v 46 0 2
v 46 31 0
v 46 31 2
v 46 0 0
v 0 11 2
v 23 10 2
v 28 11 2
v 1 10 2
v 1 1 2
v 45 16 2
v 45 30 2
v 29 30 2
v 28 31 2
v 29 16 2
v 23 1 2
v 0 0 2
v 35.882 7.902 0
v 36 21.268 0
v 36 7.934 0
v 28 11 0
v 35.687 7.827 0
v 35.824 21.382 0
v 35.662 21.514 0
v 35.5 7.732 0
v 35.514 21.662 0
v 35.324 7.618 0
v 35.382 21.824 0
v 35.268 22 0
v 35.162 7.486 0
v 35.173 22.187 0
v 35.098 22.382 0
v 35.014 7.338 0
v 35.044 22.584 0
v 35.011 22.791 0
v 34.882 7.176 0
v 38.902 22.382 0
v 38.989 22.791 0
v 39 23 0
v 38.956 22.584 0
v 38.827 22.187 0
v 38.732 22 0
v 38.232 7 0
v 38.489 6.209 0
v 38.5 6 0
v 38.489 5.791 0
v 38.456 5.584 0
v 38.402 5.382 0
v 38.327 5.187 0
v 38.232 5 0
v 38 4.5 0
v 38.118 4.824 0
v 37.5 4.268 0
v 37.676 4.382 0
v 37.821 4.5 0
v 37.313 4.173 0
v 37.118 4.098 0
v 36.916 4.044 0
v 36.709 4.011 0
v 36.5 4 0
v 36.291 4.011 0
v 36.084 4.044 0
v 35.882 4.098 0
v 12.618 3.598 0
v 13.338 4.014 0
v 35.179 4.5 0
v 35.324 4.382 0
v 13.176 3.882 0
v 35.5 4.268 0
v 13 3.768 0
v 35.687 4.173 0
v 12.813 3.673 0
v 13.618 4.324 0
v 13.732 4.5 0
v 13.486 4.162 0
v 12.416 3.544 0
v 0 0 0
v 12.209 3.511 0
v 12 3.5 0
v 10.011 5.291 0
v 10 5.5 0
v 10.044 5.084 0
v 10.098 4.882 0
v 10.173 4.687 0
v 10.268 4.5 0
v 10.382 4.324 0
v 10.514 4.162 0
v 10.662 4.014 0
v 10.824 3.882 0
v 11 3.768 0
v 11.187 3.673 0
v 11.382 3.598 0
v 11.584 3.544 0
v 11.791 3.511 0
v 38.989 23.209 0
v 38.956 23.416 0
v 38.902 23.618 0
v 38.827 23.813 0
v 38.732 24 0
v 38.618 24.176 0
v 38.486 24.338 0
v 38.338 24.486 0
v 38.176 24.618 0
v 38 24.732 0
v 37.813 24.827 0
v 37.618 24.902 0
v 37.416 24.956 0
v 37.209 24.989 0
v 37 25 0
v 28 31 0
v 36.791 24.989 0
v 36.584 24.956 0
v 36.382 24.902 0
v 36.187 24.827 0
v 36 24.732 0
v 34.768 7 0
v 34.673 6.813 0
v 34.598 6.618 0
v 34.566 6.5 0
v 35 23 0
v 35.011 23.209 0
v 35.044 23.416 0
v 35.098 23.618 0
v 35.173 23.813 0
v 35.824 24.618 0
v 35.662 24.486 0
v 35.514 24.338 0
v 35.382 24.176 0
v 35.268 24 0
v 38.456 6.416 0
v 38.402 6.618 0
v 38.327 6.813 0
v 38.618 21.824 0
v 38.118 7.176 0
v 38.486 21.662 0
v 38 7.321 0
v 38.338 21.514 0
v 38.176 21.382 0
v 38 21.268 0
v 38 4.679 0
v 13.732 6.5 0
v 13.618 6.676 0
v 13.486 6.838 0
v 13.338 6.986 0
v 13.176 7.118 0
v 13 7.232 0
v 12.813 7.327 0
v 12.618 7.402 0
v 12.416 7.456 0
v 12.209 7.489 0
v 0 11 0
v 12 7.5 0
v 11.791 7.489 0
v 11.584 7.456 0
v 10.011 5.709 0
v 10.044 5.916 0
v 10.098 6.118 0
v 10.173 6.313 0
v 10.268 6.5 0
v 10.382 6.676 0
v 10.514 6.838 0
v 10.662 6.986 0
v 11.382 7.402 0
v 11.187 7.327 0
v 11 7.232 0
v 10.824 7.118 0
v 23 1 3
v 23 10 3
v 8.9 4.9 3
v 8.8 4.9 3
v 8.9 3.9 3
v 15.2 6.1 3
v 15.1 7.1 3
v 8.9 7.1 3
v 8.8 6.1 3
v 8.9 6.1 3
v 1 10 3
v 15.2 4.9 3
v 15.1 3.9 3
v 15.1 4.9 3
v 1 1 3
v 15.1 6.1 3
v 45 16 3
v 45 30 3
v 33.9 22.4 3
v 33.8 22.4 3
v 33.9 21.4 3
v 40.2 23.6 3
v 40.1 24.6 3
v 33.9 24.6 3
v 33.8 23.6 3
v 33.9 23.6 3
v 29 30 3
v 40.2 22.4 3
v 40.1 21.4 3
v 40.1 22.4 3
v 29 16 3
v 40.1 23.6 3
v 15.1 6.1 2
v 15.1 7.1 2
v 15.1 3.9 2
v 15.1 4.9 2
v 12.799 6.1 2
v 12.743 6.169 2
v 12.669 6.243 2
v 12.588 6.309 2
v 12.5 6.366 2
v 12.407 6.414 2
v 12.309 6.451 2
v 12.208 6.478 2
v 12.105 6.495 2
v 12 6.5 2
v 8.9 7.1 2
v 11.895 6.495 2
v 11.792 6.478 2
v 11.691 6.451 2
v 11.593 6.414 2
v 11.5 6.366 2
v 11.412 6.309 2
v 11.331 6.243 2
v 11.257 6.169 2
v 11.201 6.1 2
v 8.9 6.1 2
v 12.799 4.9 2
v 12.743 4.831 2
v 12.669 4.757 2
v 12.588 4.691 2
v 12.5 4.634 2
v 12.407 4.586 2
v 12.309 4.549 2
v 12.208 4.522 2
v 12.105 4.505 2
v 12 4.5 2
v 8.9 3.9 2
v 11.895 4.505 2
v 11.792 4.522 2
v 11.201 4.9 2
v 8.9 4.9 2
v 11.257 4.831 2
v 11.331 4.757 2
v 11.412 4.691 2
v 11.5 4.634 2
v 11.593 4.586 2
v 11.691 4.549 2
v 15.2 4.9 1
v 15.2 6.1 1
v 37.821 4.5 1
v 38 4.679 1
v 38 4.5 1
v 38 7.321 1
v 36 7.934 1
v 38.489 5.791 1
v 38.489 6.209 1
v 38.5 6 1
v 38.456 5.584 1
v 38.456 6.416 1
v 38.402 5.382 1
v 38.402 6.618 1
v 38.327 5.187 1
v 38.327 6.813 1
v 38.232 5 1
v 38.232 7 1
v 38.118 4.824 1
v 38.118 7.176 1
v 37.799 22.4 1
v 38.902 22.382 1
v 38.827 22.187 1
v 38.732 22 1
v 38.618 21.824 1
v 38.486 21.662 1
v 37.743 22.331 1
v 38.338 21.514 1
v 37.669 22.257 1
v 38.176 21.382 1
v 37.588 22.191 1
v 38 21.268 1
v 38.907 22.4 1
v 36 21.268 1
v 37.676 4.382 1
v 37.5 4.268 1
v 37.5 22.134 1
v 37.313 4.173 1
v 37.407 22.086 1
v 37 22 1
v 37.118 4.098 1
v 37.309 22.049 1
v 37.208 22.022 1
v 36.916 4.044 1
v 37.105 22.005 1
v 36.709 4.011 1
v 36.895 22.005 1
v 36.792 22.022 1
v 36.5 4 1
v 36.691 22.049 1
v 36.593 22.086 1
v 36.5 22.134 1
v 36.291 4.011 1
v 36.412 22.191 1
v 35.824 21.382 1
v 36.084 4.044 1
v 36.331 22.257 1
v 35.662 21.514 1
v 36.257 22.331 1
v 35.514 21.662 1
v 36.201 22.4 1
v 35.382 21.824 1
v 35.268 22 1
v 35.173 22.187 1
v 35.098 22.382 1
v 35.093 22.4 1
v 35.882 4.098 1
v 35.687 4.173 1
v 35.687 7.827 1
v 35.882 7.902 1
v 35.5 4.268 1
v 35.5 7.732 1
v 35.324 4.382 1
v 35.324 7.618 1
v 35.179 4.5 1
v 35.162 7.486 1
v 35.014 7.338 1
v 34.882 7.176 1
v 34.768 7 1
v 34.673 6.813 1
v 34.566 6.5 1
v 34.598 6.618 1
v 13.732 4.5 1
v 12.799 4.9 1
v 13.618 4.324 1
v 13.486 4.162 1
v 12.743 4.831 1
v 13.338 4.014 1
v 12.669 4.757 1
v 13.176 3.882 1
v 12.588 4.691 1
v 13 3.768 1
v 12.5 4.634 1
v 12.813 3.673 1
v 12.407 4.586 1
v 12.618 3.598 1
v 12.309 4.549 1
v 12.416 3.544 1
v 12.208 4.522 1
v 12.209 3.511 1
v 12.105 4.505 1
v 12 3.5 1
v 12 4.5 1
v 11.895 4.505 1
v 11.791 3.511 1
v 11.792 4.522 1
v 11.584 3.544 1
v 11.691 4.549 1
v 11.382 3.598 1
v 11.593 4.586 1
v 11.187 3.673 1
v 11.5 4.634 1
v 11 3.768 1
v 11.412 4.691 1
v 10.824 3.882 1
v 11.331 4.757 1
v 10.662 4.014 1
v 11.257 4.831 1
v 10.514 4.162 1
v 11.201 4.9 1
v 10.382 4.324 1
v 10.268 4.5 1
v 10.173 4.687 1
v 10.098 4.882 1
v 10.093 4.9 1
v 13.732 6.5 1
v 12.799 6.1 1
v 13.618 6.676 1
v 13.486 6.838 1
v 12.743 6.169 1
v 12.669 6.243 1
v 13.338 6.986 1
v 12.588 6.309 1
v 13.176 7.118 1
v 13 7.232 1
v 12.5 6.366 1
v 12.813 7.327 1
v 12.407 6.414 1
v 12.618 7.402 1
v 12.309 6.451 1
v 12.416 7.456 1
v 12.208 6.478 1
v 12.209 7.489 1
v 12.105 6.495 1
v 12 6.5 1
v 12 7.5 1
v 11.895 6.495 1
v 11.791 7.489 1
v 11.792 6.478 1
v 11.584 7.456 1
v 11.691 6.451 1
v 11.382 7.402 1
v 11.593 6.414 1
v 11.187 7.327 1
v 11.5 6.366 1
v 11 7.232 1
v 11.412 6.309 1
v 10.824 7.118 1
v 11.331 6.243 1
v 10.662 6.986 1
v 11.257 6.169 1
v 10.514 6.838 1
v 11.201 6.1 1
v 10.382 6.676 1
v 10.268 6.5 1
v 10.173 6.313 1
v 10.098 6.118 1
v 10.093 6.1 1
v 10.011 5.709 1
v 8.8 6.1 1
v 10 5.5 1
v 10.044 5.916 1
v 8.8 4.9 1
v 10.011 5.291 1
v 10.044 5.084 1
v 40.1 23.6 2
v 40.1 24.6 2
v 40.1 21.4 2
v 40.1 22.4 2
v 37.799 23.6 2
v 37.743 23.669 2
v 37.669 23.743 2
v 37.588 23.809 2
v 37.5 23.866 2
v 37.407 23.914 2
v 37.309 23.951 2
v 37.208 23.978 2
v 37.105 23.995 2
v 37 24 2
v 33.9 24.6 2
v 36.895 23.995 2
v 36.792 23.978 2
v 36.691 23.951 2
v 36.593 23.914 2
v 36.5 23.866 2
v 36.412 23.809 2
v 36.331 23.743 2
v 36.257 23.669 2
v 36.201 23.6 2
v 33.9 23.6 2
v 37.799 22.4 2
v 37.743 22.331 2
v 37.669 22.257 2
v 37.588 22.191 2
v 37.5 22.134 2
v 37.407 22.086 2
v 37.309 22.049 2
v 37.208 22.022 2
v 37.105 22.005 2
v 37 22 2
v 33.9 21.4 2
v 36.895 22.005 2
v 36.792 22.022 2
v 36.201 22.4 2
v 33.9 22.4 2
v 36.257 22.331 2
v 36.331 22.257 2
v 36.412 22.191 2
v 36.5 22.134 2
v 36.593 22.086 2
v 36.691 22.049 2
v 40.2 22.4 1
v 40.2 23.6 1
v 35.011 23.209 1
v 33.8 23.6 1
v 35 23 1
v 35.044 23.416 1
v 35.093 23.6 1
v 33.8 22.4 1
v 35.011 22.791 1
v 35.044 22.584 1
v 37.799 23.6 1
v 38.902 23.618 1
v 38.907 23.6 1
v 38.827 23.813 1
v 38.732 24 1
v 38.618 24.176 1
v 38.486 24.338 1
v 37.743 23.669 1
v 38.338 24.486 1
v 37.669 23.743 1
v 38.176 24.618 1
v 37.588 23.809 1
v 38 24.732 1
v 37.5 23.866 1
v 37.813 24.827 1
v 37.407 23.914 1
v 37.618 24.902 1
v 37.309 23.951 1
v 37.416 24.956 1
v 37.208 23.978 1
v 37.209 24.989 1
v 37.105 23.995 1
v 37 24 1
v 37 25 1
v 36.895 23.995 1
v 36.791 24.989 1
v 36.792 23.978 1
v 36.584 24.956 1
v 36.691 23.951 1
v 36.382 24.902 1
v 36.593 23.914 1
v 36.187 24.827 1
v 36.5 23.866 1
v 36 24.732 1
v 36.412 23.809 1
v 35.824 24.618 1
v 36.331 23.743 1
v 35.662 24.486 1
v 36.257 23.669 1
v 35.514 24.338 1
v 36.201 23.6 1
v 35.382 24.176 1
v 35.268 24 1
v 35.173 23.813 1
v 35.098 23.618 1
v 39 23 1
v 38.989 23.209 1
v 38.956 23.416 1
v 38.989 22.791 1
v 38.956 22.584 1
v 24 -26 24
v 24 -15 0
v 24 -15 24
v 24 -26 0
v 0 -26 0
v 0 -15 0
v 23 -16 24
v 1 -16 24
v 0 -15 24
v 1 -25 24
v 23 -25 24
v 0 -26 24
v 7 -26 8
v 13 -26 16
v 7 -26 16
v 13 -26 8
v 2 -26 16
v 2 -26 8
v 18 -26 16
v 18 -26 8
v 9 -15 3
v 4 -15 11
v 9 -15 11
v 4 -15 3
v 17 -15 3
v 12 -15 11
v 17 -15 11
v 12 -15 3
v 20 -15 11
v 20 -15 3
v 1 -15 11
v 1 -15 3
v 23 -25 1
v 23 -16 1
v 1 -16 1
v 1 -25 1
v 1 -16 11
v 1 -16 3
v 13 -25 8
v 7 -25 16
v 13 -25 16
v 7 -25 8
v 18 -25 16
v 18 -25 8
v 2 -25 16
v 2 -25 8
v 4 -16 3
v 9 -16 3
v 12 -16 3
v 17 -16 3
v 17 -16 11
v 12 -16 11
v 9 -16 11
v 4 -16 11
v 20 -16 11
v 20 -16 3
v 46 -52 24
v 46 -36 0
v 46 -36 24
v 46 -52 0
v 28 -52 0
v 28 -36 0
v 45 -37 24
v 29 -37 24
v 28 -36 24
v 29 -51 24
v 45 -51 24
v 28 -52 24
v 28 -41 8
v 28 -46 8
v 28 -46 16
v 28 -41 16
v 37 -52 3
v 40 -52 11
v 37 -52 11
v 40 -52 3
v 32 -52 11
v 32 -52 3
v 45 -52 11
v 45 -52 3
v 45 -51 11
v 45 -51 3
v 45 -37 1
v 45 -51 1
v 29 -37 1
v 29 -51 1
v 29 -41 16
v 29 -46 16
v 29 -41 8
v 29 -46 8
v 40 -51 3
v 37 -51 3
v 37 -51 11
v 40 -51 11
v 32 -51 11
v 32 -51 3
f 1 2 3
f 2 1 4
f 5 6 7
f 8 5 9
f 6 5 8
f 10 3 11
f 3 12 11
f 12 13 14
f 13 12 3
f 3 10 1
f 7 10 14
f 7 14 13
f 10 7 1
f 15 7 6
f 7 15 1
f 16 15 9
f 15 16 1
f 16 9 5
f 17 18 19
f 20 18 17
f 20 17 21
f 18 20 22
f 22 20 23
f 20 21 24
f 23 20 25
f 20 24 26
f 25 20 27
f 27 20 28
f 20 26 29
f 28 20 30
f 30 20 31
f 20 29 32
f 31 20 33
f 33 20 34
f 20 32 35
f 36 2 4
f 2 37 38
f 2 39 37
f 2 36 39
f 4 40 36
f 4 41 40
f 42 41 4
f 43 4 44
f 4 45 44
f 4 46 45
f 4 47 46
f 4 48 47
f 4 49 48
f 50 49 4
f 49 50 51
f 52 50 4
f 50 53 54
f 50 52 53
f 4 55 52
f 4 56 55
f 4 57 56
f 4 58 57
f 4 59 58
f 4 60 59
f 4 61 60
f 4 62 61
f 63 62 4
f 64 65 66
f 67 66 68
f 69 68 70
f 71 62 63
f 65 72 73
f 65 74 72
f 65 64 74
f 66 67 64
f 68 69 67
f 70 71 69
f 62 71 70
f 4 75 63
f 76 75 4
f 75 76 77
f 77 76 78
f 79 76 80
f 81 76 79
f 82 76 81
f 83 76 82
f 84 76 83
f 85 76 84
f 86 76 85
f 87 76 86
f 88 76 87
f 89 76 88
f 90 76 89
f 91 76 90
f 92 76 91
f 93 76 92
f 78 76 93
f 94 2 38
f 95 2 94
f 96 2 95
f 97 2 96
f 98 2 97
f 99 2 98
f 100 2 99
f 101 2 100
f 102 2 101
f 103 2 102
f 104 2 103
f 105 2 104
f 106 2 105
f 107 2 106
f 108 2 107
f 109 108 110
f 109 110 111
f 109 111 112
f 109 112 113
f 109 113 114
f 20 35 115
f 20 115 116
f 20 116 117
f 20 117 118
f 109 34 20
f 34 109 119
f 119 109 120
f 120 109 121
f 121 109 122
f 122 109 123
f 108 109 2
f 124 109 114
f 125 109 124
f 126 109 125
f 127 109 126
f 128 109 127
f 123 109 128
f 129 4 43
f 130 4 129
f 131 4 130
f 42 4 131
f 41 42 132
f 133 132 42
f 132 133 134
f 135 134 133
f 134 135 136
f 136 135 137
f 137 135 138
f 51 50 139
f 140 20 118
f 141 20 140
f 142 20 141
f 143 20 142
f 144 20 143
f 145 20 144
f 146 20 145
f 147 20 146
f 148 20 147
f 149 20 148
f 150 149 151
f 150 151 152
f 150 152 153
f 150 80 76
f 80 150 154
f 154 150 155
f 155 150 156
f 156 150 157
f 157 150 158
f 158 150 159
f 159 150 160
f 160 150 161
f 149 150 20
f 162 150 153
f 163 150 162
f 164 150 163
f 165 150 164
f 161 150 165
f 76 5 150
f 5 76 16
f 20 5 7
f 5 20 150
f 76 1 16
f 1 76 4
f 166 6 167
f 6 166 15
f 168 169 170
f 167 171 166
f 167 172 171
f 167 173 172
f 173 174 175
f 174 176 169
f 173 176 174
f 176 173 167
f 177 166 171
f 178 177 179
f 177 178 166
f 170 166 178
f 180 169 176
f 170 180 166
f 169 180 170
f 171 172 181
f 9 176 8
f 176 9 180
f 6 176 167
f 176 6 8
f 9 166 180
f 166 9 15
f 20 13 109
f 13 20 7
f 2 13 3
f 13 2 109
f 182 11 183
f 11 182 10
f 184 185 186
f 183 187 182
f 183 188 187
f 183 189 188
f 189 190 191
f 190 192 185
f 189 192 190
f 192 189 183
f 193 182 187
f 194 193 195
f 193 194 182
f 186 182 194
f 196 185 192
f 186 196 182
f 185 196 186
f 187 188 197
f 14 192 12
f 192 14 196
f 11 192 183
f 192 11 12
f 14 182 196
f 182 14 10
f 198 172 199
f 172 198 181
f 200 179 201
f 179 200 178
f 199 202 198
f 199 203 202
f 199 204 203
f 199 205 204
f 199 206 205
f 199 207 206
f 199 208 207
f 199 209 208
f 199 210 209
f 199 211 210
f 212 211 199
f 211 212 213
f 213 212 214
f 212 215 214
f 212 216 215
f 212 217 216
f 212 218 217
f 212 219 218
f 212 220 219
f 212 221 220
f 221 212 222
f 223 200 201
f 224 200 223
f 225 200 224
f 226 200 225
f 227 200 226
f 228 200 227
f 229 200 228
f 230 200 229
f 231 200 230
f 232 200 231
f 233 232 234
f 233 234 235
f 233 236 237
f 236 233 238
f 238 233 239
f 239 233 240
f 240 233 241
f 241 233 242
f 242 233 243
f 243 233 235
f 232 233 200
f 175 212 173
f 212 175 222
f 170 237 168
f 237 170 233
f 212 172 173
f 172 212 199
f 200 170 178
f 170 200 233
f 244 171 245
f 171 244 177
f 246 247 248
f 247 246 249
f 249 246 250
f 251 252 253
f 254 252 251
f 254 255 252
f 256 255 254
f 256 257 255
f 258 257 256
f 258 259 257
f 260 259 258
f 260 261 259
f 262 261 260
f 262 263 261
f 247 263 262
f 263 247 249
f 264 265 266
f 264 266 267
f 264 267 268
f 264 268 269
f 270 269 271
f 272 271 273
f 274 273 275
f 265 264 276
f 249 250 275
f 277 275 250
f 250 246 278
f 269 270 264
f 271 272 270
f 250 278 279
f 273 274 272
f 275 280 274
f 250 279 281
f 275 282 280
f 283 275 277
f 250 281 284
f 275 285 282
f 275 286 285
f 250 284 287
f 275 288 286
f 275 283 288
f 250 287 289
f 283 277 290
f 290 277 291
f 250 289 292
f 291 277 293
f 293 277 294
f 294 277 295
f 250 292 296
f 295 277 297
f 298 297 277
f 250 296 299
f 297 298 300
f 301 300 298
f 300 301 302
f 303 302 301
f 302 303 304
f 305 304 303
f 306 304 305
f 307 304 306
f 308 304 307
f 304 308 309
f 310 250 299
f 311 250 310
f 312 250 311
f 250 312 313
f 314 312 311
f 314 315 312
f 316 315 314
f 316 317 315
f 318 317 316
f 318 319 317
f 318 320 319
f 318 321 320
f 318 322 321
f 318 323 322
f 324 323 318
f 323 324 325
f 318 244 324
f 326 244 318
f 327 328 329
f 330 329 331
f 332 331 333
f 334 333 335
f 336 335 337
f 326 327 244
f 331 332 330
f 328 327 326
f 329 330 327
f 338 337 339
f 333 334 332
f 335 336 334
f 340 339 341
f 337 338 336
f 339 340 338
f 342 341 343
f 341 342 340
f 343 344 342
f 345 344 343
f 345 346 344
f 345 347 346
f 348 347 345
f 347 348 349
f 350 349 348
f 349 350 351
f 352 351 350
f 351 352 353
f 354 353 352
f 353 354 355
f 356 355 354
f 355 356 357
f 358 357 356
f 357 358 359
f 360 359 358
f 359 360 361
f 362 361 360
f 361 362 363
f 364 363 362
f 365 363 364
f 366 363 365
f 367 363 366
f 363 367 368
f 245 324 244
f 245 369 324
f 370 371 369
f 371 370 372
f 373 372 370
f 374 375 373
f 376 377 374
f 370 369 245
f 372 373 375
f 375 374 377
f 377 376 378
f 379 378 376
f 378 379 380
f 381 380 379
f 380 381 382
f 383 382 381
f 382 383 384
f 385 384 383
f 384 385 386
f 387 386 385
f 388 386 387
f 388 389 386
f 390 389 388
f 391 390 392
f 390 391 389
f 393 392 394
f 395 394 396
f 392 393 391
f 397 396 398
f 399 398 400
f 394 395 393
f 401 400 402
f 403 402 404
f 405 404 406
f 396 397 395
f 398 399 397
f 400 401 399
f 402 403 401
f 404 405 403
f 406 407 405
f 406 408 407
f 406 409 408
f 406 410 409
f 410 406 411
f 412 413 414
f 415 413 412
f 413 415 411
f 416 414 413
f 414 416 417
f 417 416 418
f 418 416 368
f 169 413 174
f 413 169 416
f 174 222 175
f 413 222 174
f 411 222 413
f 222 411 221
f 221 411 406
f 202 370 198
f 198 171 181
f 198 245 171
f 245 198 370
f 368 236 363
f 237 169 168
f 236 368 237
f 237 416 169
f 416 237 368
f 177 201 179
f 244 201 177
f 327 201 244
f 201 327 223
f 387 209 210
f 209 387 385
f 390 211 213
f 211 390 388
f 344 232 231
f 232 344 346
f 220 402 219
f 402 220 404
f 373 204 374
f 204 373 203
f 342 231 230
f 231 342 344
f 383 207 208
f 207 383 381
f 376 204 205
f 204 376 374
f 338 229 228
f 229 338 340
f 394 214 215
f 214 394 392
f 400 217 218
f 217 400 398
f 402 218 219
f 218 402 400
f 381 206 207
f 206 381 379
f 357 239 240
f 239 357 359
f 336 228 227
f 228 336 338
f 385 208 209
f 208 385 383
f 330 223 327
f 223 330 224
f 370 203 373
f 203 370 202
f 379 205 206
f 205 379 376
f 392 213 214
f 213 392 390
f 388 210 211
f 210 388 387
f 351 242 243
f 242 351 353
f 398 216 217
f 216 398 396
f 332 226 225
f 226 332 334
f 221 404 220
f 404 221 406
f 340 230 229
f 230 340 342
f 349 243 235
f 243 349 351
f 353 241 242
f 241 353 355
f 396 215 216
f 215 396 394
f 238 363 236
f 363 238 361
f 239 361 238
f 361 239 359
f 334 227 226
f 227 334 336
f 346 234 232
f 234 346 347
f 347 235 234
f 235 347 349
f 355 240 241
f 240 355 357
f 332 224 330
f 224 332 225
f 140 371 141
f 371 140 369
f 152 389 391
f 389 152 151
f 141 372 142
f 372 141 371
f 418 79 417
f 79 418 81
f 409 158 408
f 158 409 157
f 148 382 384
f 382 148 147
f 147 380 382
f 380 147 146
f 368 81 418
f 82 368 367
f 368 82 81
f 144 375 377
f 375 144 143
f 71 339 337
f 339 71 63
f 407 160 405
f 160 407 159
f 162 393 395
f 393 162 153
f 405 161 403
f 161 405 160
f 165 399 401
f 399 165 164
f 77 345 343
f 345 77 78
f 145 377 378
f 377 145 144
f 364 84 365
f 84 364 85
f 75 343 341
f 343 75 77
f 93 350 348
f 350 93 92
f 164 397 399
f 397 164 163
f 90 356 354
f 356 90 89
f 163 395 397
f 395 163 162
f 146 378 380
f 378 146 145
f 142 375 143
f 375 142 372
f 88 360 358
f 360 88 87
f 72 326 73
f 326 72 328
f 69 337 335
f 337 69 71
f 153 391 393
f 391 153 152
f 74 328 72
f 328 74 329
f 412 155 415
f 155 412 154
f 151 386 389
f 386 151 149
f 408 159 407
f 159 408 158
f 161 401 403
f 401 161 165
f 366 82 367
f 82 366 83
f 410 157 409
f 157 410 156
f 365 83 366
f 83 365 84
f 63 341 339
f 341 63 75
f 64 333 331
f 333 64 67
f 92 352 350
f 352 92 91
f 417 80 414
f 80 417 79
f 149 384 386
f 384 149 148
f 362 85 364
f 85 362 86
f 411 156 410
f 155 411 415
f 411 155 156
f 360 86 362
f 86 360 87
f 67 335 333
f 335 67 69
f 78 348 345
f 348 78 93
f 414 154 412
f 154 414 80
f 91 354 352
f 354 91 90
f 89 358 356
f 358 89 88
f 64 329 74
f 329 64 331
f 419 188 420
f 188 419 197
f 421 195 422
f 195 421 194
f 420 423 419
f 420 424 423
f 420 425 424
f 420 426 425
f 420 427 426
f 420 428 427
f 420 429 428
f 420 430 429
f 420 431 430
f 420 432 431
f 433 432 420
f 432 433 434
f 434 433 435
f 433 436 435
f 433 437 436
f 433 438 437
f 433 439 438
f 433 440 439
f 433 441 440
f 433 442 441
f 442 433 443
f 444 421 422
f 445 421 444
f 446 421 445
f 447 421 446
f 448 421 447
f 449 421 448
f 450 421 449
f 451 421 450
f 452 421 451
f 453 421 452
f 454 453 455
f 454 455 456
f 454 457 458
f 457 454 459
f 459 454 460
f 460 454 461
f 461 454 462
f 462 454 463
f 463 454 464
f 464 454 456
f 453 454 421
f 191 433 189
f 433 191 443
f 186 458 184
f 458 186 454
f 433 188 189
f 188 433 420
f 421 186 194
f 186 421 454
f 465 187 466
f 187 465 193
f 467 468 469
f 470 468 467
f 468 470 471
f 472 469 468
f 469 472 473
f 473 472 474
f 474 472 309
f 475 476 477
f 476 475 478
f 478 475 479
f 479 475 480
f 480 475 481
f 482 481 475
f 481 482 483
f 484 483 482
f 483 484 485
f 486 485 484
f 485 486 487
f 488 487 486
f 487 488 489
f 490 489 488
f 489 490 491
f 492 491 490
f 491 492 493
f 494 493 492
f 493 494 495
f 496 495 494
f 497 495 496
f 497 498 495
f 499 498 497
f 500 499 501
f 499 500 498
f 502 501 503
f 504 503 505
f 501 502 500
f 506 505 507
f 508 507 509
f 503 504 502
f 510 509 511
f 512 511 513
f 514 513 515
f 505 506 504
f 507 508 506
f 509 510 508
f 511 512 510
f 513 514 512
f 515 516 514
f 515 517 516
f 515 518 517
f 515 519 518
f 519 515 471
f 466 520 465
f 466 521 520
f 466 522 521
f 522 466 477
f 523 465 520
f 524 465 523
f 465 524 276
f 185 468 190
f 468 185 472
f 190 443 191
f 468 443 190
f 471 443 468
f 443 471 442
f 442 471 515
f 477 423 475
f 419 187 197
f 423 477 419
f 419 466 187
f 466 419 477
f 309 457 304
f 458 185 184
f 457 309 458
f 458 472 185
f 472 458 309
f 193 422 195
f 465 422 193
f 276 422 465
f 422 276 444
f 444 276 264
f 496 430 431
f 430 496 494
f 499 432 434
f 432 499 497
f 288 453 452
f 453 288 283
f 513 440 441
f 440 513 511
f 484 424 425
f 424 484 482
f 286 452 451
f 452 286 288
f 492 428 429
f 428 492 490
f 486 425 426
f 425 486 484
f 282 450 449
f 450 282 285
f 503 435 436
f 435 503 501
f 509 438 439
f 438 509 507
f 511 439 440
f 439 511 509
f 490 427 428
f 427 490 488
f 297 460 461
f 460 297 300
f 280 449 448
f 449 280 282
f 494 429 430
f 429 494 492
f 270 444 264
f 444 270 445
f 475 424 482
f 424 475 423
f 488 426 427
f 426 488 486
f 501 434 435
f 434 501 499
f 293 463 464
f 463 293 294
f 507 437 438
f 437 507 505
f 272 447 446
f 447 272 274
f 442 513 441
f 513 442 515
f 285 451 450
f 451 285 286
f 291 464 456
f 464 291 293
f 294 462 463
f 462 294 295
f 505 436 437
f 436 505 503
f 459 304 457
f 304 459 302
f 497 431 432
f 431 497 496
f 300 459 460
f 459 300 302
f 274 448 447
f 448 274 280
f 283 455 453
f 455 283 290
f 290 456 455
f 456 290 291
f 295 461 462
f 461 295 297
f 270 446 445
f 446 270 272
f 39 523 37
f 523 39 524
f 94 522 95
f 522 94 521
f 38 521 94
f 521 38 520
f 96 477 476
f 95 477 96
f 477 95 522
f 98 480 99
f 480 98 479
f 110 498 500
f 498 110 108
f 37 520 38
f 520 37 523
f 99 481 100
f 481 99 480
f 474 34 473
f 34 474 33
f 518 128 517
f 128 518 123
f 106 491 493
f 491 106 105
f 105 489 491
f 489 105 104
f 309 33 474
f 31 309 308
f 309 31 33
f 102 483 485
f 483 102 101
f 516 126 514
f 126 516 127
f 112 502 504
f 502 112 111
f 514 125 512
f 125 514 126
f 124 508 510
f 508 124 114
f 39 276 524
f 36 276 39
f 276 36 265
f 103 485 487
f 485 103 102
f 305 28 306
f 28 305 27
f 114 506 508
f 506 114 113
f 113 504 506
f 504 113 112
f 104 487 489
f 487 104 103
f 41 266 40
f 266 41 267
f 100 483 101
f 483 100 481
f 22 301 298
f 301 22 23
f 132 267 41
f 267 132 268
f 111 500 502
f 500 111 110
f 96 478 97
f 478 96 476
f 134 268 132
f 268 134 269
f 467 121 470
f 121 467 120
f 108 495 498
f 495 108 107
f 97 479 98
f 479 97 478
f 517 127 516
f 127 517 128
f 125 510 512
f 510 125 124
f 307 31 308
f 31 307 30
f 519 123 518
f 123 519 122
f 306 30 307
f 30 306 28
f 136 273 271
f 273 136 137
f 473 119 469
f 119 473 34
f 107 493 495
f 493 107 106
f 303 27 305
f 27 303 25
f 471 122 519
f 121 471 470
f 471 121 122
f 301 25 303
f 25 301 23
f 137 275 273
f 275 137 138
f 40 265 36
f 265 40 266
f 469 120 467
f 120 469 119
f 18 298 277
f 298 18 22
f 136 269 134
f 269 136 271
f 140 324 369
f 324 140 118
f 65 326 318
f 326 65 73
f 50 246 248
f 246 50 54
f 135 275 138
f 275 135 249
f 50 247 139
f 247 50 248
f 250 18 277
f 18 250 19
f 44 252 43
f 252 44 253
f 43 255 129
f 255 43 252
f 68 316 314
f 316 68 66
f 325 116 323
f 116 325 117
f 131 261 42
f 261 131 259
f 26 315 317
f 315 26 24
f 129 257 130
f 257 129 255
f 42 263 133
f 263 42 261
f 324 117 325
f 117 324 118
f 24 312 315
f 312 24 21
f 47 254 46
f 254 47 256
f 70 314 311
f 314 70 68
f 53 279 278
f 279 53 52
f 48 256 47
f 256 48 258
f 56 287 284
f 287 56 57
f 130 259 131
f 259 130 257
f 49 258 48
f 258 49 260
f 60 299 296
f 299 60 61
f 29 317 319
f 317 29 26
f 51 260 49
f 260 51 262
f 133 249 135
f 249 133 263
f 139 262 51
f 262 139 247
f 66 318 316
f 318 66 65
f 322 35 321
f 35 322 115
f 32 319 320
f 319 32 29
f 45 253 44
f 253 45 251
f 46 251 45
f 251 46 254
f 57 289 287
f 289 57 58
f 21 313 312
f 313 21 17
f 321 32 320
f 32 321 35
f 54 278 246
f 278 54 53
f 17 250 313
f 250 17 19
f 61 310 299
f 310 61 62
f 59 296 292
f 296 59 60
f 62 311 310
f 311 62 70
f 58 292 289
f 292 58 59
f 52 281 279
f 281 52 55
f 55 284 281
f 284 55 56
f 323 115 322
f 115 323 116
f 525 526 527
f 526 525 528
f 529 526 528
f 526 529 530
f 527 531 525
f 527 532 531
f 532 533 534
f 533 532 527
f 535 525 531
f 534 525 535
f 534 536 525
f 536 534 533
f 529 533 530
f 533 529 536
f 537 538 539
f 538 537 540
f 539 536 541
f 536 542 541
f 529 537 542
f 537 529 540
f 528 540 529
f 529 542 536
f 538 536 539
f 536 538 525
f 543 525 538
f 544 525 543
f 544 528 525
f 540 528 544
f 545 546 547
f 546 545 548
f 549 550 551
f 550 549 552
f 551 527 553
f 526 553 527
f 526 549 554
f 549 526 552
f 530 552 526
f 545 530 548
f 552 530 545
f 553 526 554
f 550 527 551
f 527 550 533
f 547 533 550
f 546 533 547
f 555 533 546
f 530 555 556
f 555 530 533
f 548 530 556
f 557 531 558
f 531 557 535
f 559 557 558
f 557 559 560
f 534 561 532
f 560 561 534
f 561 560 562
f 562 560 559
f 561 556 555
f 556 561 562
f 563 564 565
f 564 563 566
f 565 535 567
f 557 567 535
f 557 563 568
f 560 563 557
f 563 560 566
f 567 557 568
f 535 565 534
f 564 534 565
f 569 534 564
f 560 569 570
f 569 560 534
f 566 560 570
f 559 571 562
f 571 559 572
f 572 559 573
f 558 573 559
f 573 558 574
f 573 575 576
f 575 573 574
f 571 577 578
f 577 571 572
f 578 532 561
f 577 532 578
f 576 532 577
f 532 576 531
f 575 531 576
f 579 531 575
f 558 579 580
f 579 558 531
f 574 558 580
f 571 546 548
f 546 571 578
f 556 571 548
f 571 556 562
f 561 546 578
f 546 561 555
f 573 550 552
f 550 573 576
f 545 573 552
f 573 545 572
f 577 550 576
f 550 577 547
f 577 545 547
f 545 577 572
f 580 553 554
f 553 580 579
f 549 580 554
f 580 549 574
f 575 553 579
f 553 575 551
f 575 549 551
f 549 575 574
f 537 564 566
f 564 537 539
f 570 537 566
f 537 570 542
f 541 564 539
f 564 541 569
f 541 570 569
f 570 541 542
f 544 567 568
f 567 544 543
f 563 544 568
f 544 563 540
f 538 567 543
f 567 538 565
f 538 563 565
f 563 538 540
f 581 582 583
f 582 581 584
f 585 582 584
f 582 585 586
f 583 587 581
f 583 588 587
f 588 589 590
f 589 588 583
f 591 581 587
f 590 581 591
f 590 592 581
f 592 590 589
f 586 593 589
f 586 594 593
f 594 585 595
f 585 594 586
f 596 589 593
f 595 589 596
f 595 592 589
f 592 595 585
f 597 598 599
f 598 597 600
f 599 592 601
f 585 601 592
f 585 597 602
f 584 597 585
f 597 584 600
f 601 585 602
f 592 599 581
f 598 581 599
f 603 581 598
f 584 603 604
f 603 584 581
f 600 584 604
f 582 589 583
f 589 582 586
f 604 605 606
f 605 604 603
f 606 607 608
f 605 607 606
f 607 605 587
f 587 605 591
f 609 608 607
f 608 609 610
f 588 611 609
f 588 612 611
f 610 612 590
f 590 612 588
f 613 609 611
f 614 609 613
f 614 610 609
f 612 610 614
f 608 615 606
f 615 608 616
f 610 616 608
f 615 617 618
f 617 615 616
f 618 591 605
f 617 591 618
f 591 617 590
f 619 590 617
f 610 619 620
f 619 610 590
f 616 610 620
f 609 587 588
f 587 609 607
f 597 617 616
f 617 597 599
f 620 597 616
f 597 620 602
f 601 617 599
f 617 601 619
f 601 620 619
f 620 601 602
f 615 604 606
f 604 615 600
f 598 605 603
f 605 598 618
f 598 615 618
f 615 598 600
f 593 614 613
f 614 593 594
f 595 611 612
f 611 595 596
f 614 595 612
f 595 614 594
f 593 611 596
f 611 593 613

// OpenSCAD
$fn= 60;

module rounded_cylinder(r,h,n) {
  rotate_extrude(convexity=1) {
    offset(r=n) offset(delta=-n) square([r,h]);
    square([n,h]);
  }
}

module plate () {
  difference() {
    union() {
      translate([0, 0, 0]) cube([46, 11, 2]);
      translate([1, 1, 0]) cube([22, 9, 3]);
      translate([28, 0, 0]) cube([18, 31, 2]);
      translate([29, 16, 0]) cube([16, 14, 3]);
    }
    translate([12, 5.5, 3]) {
      cube([6.2, 3.2, 2], center=true);
      cube([6.4, 1.2, 4], center=true);
      cylinder(r=1, h=8, center= true);
      translate([0, 0, -3]) cylinder(r=2, h=2, center= true);
    }
    translate([37, 23, 3]) {
      cube([6.2, 3.2, 2], center=true);
      cube([6.4, 1.2, 4], center=true);
      cylinder(r=1, h=8, center= true);
      translate([0, 0, -3]) cylinder(r=2, h=2, center= true);
    }
    translate([12, 4.5, -1]) cube([25,2,2]);
    translate([36, 4.5, -1]) cube([2,18.5,2]);
    translate([36.5, 6, 0]) cylinder(r=2, h=2, center= true);
  }
}

plate();

rotate([180, 0, 0])
translate([0, 15, -24]) difference() {    
  cube([24,11,24]);
  translate([1,1,-1])  cube([22,9,24]);

  translate([1,-1,13])  cube([3,4,8]);
  translate([9,-1,13])  cube([3,4,8]);
  translate([17,-1,13])  cube([3,4,8]);

  translate([2,9,8])  cube([5,4,8]);
  translate([13,9,8])  cube([5,4,8]);

}
rotate([180, 0, 0])
translate([28, 36, -24]) difference() {
  cube([18,16,24]);
  translate([1,1,-1]) cube([16,14,24]);

  translate([4, 13, 13])  cube([5,4,8]);
  translate([12, 13, 13])  cube([5,4,8]);


  translate([-1,5,8])  cube([4,5,8]);

}
